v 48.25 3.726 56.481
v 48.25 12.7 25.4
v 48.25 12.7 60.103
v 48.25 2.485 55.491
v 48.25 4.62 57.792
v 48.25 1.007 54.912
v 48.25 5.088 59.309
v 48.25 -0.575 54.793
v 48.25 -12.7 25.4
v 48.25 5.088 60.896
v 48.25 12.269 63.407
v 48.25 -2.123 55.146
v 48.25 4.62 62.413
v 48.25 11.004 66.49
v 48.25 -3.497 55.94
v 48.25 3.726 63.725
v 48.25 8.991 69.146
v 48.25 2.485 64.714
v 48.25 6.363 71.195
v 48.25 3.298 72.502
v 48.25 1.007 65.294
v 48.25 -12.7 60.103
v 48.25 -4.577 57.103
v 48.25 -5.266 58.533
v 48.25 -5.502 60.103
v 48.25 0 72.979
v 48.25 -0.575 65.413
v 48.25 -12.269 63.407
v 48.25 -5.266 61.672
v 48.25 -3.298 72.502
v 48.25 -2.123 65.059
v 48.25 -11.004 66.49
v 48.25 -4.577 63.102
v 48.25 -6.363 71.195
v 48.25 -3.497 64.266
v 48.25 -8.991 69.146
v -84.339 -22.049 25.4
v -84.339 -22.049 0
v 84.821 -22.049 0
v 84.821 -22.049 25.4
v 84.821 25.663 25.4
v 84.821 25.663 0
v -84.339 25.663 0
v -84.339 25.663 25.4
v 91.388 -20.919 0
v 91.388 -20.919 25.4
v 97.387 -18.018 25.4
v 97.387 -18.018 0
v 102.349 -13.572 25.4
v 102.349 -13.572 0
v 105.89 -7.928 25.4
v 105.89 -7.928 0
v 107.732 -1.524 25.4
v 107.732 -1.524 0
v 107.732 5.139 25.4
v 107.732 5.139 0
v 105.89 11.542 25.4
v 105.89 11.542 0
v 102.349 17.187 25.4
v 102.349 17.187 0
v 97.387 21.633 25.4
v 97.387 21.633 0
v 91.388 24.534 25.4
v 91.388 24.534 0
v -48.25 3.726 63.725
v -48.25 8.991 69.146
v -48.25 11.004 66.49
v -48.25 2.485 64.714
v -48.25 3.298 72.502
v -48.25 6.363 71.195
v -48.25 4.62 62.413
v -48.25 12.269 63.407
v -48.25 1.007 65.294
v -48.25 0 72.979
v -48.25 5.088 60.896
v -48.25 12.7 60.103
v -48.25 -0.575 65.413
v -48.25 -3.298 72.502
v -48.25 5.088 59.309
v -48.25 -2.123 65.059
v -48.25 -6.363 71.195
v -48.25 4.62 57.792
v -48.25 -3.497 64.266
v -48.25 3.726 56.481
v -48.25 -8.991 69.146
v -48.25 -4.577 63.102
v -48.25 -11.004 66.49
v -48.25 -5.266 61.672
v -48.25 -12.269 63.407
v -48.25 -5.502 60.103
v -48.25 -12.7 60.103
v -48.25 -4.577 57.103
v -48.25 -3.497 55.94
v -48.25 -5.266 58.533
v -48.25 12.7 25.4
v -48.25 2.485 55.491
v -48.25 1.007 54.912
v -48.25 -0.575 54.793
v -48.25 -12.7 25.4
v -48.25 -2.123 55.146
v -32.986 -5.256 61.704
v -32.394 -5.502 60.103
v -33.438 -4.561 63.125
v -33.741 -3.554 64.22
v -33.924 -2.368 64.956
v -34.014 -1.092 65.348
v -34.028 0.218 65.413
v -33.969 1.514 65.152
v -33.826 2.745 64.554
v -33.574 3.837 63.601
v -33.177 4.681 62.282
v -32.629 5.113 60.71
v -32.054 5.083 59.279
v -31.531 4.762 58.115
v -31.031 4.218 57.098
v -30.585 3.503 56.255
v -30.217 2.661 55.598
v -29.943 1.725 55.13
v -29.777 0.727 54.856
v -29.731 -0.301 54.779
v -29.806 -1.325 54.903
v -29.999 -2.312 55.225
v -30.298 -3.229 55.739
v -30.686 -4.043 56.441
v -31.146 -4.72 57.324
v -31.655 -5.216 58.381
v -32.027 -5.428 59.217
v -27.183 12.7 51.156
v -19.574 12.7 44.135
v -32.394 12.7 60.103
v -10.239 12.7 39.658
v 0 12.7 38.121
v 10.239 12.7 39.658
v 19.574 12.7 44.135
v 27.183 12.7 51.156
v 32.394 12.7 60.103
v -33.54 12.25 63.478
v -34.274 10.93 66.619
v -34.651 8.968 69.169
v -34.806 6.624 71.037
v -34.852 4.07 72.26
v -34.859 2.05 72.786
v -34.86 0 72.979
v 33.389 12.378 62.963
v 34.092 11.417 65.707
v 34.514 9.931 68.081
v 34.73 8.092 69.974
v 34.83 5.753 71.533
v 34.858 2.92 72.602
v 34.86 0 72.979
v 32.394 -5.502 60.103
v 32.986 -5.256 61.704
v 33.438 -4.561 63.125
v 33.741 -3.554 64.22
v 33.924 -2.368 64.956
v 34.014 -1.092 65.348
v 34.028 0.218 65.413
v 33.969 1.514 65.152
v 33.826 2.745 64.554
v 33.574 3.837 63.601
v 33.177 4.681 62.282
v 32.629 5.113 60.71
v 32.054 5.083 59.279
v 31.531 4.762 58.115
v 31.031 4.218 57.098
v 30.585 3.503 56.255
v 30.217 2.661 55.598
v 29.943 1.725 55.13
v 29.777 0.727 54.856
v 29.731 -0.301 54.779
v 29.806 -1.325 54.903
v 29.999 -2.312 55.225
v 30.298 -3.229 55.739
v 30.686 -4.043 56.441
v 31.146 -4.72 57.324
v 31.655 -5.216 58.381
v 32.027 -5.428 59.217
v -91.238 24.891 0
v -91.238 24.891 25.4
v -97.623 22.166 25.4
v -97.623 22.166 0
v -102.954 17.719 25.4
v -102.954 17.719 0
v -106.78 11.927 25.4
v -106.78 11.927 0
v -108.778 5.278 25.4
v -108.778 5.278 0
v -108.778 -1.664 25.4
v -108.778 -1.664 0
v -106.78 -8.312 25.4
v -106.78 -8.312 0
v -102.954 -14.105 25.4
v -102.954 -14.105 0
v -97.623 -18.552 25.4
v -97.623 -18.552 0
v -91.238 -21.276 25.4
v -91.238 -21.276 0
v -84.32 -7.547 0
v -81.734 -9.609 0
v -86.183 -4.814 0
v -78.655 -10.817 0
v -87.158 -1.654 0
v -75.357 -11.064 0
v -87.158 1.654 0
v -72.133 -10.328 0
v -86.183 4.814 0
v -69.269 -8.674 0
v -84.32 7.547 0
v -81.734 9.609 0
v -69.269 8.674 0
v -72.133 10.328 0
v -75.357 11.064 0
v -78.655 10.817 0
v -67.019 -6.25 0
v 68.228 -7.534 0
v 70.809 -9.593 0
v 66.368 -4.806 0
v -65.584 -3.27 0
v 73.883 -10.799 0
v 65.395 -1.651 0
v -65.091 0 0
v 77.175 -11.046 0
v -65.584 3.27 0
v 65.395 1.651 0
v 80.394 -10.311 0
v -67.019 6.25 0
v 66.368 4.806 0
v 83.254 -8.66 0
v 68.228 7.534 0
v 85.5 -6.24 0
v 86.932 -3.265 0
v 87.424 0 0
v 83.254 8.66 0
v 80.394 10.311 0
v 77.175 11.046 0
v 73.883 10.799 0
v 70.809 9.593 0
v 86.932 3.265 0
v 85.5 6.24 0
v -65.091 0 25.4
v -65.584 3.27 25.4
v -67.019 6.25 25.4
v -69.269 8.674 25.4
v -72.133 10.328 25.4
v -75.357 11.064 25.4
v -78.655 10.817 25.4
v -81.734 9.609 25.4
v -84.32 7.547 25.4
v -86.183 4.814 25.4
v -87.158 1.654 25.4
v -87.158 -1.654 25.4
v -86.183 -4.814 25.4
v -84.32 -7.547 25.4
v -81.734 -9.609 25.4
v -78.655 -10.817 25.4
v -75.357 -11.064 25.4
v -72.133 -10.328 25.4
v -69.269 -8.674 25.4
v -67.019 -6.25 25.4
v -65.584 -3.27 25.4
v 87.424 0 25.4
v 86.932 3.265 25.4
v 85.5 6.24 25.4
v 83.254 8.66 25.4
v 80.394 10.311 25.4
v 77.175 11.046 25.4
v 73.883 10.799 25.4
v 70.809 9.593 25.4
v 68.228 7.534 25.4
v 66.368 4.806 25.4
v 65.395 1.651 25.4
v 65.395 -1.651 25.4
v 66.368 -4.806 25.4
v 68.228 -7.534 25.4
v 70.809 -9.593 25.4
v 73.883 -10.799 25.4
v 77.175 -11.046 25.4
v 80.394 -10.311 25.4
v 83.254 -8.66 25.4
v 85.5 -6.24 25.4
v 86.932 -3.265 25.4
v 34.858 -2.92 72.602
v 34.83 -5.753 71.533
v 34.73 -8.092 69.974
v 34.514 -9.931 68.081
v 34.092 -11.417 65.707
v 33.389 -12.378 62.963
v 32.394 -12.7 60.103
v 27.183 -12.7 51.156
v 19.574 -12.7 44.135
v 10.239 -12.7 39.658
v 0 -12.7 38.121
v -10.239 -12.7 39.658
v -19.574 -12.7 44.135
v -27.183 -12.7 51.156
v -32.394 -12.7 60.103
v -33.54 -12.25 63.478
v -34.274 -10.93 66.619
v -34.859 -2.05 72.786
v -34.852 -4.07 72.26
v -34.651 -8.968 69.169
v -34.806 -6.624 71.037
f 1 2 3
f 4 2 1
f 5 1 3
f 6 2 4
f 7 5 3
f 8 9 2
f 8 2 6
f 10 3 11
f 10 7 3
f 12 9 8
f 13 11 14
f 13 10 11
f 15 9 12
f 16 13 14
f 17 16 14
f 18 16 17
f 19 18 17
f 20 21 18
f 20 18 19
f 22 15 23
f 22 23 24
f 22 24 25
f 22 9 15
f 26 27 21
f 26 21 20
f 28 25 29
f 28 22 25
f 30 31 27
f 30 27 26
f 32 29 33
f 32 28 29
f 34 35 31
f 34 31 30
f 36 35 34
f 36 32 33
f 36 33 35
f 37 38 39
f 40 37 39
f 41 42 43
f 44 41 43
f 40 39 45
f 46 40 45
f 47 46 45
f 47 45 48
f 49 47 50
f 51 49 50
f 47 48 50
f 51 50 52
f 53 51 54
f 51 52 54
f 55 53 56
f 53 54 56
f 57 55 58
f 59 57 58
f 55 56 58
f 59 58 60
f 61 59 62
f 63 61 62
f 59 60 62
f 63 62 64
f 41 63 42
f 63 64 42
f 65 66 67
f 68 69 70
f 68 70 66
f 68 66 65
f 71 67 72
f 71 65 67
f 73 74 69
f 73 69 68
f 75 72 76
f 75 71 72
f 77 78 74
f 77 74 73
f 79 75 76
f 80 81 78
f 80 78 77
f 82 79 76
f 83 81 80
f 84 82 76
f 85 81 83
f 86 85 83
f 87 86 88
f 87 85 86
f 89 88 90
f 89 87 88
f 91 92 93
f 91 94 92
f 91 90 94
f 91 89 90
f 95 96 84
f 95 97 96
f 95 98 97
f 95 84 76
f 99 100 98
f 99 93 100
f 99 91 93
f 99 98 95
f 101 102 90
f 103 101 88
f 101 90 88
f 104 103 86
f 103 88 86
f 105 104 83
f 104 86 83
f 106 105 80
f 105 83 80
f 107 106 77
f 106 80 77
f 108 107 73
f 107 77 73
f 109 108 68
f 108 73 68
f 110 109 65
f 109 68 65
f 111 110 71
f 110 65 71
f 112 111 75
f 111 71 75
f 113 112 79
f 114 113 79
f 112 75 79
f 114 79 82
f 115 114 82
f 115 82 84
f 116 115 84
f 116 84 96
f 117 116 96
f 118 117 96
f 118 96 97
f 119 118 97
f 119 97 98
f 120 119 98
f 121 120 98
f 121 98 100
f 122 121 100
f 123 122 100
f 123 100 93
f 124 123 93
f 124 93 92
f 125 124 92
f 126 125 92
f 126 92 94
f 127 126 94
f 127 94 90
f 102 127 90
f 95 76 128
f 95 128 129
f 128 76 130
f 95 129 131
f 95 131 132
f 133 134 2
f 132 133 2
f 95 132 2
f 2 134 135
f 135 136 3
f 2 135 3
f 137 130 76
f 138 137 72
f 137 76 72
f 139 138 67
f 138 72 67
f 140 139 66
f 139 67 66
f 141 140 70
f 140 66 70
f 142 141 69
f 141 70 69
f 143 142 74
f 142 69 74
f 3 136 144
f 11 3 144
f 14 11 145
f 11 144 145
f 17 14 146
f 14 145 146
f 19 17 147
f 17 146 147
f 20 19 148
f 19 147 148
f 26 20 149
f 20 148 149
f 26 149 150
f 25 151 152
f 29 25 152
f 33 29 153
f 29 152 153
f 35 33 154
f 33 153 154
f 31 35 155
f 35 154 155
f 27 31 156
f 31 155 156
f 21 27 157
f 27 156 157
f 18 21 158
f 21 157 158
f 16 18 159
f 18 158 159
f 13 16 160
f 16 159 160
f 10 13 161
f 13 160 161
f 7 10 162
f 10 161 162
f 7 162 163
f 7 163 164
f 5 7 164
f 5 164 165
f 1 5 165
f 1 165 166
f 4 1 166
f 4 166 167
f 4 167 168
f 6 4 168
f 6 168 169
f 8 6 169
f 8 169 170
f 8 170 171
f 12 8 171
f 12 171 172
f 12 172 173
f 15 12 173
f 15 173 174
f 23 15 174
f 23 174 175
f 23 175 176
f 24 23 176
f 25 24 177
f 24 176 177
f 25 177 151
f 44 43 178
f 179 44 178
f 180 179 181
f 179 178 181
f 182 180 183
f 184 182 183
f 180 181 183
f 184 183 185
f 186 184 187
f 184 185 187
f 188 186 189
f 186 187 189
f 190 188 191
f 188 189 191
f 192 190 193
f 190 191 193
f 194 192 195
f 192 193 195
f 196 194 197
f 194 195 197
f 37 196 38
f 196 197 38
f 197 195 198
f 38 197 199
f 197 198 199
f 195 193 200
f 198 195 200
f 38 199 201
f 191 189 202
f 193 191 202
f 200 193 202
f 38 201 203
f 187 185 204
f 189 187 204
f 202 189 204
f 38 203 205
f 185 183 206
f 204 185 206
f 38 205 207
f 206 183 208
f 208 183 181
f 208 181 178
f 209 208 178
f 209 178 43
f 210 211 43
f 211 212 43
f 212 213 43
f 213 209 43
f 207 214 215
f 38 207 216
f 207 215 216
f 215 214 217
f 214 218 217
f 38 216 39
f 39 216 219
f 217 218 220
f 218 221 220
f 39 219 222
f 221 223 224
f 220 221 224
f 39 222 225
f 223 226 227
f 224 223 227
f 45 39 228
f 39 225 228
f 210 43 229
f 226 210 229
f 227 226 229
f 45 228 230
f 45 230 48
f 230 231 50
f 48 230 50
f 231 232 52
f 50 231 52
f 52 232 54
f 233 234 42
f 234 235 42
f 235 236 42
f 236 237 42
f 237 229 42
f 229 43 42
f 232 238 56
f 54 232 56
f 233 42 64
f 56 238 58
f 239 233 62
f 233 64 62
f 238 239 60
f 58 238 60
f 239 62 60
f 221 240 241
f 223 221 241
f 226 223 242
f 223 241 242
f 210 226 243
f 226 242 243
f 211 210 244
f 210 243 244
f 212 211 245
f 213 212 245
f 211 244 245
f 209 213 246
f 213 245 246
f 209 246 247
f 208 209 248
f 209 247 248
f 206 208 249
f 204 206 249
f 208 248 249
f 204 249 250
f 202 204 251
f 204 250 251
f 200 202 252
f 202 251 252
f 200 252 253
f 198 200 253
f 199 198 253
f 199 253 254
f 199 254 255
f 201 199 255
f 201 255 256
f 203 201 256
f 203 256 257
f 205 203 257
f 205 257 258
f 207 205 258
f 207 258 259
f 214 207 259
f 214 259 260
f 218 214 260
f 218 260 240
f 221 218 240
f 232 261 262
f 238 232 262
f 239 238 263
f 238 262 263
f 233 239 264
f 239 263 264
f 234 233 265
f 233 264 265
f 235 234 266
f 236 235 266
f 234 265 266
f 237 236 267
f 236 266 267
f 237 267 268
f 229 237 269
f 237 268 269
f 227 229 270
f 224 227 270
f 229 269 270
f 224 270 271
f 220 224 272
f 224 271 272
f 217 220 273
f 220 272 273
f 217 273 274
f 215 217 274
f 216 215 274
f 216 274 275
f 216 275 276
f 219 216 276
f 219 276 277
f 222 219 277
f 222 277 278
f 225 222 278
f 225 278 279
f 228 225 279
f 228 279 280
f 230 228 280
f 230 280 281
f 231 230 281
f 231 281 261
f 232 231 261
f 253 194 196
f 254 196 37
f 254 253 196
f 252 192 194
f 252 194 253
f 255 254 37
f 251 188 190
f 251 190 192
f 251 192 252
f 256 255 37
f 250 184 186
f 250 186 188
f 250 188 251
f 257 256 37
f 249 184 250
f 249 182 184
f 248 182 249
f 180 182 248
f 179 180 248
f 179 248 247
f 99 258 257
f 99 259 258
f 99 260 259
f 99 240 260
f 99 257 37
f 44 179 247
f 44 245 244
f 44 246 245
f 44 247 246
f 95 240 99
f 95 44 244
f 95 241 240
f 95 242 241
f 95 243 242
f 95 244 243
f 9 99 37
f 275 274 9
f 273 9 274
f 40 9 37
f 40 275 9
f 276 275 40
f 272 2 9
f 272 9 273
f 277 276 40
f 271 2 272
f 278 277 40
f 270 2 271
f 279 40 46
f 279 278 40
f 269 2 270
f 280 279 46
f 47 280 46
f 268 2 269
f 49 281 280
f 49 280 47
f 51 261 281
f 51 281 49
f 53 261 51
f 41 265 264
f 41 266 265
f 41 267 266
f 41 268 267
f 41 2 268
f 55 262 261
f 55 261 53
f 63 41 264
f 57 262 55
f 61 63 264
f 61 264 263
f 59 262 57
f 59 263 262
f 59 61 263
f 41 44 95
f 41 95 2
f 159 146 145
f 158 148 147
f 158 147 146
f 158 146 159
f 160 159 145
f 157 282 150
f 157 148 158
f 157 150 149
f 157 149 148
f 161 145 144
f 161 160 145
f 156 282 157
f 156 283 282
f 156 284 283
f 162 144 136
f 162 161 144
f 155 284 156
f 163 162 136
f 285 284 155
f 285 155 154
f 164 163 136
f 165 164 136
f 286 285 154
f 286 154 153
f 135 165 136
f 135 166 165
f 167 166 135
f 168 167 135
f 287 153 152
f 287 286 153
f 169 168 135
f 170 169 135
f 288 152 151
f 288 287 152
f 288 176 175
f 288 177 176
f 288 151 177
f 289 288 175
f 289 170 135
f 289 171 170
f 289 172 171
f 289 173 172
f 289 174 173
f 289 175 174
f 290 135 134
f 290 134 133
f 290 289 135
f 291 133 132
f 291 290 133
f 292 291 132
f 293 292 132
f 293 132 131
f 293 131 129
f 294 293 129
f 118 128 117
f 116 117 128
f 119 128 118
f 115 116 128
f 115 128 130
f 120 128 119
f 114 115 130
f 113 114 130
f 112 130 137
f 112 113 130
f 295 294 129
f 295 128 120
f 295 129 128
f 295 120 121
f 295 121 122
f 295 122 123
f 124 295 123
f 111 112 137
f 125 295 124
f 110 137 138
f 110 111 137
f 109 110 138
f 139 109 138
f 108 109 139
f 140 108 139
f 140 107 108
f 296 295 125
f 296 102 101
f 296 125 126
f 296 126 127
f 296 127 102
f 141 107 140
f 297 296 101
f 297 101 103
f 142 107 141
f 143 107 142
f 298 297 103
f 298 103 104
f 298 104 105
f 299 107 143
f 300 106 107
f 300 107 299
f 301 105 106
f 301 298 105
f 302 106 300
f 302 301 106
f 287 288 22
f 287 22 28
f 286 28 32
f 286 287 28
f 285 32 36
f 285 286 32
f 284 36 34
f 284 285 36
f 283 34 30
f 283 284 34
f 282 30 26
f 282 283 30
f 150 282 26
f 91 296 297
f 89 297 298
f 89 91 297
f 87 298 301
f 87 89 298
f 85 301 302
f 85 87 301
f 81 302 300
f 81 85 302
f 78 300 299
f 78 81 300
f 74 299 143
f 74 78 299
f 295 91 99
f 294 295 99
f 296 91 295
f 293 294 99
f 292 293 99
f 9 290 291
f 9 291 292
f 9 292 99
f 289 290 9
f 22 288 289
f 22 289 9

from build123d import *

# Parameters (mm, degrees)
F1_DEPTH    = 25.4
F2_R        = 11.0950895879
F2_R_2      = 11.0767516797
F3_DEPTH    = 51.816
F5_DEPTH    = 12.7
F6_T1_DEPTH = 77.7777149491
F6_T3_DEPTH = 77.7777149491
F7_R        = 5.3247390171
F8_DEPTH    = 189.484


# Not quite as in the source:
# - a fillet or chamfer that OpenCascade refuses, or shapes differently, is made with other operations: its cross-section is extruded or revolved along the edge and cut away or added


with BuildPart() as f1:
    # F0 (on Top) → F1 (new body)
    with BuildSketch(Plane.XY):
        with BuildLine():
            Line((-84.3394622207, -22.0487453043), (-84.3394622207, 25.6632901728))
            ThreePointArc((-84.3394622207, 25.6632901728), (-109.0315538503, 1.8072724342), (-84.3394622207, -22.0487453043))
        make_face()
        Polygon((83.375572493, 25.6632901728), (-84.3394622207, 25.6632901728), (-84.3394622207, -22.0487453043), (83.375572493, -22.0487453043), (84.8214030266, -22.0487453043), (84.8214030266, 25.6632901728), align=None)
        with BuildLine():
            ThreePointArc((84.8214030266, -22.0487453043), (107.965456332, 1.8072724342), (84.8214030266, 25.6632901728))
            Line((84.8214030266, 25.6632901728), (84.8214030266, -22.0487453043))
        make_face()
    extrude(amount=F1_DEPTH)

    # F2 (on face) → F3 (cut)
    with BuildSketch(Plane.XY.offset(25.4)):
        with Locations((-76.1863589287, 0)):
            Circle(F2_R)
        with Locations((76.3475745916, 0)):
            Circle(F2_R_2)
    extrude(amount=-F3_DEPTH, mode=Mode.SUBTRACT)

    # F4 (on Front) → F5 (join, symmetric)
    with BuildSketch(Plane.XZ):
        with BuildLine():
            Line((-34.8596895088, 72.9802176356), (-48.2503287494, 72.9802176356))
            Line((-48.2503287494, 72.9802176356), (-48.2503287494, 0))
            Line((-48.2503287494, 0), (48.2503287494, 0))
            Line((48.2503287494, 0), (48.2503287494, 72.9802176356))
            Line((48.2503287494, 72.9802176356), (34.8596895088, 72.9802176356))
            ThreePointArc((34.8596895088, 72.9802176356), (0, 38.1205281268), (-34.8596895088, 72.9802176356))
        make_face()
    extrude(amount=F5_DEPTH, both=True)

    # F6: fillet of radius 12.8774151417 on 4 edges, made by hand

    # F6_s2 → F6_t1 (cut)
    with BuildSketch(Plane.YZ.offset(-80.4438666037)):
        with BuildLine():
            ThreePointArc((-12.7, 60.1028024939), (-8.9282924292, 69.2085100648), (0.1774151417, 72.9802176356))
            Line((0.1774151417, 72.9802176356), (-12.7, 72.9802176356))
            Line((-12.7, 72.9802176356), (-12.7, 60.1028024939))
        make_face()
        with BuildLine():
            ThreePointArc((12.7, 60.1028024939), (8.9282924292, 69.2085100648), (-0.1774151417, 72.9802176356))
            Line((-0.1774151417, 72.9802176356), (12.7, 72.9802176356))
            Line((12.7, 72.9802176356), (12.7, 60.1028024939))
        make_face()
    extrude(amount=F6_T1_DEPTH, mode=Mode.SUBTRACT)

    # F6_s4 → F6_t3 (cut)
    with BuildSketch(Plane.YZ.offset(2.6661516546)):
        with BuildLine():
            ThreePointArc((12.7, 60.1028024939), (8.9282924292, 69.2085100648), (-0.1774151417, 72.9802176356))
            Line((-0.1774151417, 72.9802176356), (12.7, 72.9802176356))
            Line((12.7, 72.9802176356), (12.7, 60.1028024939))
        make_face()
        with BuildLine():
            ThreePointArc((-12.7, 60.1028024939), (-8.9282924292, 69.2085100648), (0.1774151417, 72.9802176356))
            Line((0.1774151417, 72.9802176356), (-12.7, 72.9802176356))
            Line((-12.7, 72.9802176356), (-12.7, 60.1028024939))
        make_face()
    extrude(amount=F6_T3_DEPTH, mode=Mode.SUBTRACT)

    # F7 (on face) → F8 (cut)
    with BuildSketch(Plane(origin=(-48.2503287494, 0, 0), x_dir=(0, -1, 0), z_dir=(-1, 0, 0))):
        with Locations((0.1774151417, 60.1028024939)):
            Circle(F7_R)
    extrude(amount=-F8_DEPTH, mode=Mode.SUBTRACT)


solid = f1.part
